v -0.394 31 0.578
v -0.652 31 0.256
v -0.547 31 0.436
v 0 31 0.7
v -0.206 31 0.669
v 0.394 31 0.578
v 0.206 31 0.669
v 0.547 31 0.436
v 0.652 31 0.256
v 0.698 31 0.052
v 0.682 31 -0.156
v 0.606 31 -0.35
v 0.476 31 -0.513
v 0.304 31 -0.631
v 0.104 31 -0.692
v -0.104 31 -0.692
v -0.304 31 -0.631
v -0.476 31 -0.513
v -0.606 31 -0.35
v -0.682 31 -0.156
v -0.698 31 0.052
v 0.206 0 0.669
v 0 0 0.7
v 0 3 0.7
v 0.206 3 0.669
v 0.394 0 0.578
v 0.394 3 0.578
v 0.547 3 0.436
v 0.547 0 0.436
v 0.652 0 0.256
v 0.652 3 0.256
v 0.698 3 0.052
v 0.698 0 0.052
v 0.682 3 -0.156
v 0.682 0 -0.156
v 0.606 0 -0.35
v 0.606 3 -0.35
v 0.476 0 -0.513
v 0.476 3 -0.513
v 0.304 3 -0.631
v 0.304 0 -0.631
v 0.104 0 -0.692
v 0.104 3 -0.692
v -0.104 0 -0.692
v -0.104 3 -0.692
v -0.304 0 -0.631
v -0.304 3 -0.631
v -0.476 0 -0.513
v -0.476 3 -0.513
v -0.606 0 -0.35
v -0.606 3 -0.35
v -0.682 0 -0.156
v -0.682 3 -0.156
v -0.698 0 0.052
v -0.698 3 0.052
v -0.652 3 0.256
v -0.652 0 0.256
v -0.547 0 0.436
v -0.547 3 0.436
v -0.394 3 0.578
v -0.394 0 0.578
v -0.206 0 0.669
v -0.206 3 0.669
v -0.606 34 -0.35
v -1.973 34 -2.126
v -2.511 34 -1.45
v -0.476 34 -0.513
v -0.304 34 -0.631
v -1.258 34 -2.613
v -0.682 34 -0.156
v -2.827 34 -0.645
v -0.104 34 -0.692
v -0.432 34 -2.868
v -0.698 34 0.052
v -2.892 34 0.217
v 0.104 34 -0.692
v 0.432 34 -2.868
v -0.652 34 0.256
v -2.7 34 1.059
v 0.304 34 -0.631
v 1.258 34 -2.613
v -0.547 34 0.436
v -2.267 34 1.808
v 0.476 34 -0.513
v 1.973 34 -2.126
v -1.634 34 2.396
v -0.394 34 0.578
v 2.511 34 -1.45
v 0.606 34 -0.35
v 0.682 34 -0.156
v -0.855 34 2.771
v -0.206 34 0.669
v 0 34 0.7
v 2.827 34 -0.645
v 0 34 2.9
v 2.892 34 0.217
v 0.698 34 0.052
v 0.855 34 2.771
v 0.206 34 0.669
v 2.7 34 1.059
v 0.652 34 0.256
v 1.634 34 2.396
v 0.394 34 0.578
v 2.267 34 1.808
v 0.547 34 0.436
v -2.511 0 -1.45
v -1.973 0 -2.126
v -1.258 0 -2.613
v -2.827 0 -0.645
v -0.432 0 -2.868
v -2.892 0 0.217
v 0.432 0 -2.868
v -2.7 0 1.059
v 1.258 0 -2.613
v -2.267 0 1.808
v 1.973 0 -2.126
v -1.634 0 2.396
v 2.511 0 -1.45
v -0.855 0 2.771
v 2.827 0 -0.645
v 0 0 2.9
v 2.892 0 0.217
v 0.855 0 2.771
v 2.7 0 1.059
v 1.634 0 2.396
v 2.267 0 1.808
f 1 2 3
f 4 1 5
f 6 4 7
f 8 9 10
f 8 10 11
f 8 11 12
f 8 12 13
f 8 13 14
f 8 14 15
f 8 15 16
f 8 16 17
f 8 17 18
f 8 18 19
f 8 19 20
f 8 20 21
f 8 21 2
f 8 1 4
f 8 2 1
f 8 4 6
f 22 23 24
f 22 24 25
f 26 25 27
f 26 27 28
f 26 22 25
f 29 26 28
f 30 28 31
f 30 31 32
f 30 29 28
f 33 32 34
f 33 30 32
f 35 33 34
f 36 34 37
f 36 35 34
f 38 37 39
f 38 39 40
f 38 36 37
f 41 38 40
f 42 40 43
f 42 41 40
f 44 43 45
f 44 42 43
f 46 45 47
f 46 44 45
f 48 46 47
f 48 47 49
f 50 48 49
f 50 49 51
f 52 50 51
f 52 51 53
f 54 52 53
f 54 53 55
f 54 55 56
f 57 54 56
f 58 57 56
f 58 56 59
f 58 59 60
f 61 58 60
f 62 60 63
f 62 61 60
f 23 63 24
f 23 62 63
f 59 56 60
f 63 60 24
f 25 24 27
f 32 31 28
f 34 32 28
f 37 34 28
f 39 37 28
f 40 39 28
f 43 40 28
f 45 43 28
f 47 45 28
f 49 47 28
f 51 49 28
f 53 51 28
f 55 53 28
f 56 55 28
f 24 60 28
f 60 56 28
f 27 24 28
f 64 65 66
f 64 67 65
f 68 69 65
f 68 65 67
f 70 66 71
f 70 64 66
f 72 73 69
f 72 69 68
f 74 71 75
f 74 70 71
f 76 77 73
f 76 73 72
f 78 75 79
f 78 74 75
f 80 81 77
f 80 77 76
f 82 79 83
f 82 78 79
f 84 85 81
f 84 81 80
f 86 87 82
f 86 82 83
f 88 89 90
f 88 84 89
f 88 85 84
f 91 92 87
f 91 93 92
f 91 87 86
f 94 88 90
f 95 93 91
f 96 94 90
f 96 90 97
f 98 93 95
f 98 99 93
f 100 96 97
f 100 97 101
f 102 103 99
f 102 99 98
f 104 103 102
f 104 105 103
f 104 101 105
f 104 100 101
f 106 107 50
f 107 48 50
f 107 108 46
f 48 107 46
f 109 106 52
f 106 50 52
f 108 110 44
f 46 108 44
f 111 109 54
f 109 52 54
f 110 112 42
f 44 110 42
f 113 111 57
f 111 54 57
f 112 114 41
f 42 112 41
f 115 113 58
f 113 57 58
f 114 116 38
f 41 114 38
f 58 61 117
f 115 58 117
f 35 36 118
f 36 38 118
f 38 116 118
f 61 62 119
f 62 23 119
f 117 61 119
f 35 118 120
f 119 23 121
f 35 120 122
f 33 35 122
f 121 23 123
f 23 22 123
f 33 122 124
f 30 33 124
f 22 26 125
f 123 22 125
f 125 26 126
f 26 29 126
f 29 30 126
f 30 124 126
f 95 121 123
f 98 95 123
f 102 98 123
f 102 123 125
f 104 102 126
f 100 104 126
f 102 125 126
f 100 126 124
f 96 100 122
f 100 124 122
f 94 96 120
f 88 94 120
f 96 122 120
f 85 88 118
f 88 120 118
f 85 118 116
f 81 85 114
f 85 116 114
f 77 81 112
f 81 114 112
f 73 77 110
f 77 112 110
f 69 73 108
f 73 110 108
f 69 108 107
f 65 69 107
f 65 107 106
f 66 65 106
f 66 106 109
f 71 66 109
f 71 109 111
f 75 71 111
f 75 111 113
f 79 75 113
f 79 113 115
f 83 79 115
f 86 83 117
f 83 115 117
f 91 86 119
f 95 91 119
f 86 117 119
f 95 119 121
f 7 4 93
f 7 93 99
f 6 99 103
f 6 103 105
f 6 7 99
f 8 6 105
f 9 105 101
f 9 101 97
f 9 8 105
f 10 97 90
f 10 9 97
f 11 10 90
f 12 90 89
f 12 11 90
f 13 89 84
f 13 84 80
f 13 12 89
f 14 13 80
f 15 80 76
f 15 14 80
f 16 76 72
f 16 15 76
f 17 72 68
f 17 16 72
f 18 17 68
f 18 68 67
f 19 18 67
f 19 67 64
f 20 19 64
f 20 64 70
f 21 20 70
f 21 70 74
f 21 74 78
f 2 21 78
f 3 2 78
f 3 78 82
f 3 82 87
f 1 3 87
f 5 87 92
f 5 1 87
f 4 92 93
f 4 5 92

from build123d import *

# Parameters (mm, degrees)
SKETCH_4_R          = 2.9
EXTRUDE_1_DEPTH     = 34
SKETCH_4_5_R        = 0.7
CUT_EXTRUDE_1_DEPTH = 3
CUT_EXTRUDE_START   = 31
SKETCH_4_6_R        = 0.7
CUT_EXTRUDE_2_DEPTH = 3


with BuildPart() as part:
    # 草图4 → 凸台-拉伸1 (new body)
    with BuildSketch(Plane(origin=(0, 0, 0), x_dir=(1, 0, 0), z_dir=(0, 1, 0))):
        with Locations(Location((0, 0, 0), (0, 0, 270))):
            Circle(SKETCH_4_R)
    extrude(amount=EXTRUDE_1_DEPTH)

    # 草图4<5> → 切除-拉伸1 (cut)
    with BuildSketch(Plane(origin=(0, 0, 0), x_dir=(1, 0, 0), z_dir=(0, 1, 0))):
        with Locations(Location((0, 0, 0), (0, 0, 270))):
            Circle(SKETCH_4_5_R)
    extrude(amount=CUT_EXTRUDE_1_DEPTH, mode=Mode.SUBTRACT)

    # 草图4<6> → 切除-拉伸2 (cut)
    with BuildSketch(Plane(origin=(0, 0, 0), x_dir=(1, 0, 0), z_dir=(0, 1, 0)).offset(CUT_EXTRUDE_START)):
        with Locations(Location((0, 0, 0), (0, 0, 270))):
            Circle(SKETCH_4_6_R)
    extrude(amount=CUT_EXTRUDE_2_DEPTH, mode=Mode.SUBTRACT)


solid = part.part
